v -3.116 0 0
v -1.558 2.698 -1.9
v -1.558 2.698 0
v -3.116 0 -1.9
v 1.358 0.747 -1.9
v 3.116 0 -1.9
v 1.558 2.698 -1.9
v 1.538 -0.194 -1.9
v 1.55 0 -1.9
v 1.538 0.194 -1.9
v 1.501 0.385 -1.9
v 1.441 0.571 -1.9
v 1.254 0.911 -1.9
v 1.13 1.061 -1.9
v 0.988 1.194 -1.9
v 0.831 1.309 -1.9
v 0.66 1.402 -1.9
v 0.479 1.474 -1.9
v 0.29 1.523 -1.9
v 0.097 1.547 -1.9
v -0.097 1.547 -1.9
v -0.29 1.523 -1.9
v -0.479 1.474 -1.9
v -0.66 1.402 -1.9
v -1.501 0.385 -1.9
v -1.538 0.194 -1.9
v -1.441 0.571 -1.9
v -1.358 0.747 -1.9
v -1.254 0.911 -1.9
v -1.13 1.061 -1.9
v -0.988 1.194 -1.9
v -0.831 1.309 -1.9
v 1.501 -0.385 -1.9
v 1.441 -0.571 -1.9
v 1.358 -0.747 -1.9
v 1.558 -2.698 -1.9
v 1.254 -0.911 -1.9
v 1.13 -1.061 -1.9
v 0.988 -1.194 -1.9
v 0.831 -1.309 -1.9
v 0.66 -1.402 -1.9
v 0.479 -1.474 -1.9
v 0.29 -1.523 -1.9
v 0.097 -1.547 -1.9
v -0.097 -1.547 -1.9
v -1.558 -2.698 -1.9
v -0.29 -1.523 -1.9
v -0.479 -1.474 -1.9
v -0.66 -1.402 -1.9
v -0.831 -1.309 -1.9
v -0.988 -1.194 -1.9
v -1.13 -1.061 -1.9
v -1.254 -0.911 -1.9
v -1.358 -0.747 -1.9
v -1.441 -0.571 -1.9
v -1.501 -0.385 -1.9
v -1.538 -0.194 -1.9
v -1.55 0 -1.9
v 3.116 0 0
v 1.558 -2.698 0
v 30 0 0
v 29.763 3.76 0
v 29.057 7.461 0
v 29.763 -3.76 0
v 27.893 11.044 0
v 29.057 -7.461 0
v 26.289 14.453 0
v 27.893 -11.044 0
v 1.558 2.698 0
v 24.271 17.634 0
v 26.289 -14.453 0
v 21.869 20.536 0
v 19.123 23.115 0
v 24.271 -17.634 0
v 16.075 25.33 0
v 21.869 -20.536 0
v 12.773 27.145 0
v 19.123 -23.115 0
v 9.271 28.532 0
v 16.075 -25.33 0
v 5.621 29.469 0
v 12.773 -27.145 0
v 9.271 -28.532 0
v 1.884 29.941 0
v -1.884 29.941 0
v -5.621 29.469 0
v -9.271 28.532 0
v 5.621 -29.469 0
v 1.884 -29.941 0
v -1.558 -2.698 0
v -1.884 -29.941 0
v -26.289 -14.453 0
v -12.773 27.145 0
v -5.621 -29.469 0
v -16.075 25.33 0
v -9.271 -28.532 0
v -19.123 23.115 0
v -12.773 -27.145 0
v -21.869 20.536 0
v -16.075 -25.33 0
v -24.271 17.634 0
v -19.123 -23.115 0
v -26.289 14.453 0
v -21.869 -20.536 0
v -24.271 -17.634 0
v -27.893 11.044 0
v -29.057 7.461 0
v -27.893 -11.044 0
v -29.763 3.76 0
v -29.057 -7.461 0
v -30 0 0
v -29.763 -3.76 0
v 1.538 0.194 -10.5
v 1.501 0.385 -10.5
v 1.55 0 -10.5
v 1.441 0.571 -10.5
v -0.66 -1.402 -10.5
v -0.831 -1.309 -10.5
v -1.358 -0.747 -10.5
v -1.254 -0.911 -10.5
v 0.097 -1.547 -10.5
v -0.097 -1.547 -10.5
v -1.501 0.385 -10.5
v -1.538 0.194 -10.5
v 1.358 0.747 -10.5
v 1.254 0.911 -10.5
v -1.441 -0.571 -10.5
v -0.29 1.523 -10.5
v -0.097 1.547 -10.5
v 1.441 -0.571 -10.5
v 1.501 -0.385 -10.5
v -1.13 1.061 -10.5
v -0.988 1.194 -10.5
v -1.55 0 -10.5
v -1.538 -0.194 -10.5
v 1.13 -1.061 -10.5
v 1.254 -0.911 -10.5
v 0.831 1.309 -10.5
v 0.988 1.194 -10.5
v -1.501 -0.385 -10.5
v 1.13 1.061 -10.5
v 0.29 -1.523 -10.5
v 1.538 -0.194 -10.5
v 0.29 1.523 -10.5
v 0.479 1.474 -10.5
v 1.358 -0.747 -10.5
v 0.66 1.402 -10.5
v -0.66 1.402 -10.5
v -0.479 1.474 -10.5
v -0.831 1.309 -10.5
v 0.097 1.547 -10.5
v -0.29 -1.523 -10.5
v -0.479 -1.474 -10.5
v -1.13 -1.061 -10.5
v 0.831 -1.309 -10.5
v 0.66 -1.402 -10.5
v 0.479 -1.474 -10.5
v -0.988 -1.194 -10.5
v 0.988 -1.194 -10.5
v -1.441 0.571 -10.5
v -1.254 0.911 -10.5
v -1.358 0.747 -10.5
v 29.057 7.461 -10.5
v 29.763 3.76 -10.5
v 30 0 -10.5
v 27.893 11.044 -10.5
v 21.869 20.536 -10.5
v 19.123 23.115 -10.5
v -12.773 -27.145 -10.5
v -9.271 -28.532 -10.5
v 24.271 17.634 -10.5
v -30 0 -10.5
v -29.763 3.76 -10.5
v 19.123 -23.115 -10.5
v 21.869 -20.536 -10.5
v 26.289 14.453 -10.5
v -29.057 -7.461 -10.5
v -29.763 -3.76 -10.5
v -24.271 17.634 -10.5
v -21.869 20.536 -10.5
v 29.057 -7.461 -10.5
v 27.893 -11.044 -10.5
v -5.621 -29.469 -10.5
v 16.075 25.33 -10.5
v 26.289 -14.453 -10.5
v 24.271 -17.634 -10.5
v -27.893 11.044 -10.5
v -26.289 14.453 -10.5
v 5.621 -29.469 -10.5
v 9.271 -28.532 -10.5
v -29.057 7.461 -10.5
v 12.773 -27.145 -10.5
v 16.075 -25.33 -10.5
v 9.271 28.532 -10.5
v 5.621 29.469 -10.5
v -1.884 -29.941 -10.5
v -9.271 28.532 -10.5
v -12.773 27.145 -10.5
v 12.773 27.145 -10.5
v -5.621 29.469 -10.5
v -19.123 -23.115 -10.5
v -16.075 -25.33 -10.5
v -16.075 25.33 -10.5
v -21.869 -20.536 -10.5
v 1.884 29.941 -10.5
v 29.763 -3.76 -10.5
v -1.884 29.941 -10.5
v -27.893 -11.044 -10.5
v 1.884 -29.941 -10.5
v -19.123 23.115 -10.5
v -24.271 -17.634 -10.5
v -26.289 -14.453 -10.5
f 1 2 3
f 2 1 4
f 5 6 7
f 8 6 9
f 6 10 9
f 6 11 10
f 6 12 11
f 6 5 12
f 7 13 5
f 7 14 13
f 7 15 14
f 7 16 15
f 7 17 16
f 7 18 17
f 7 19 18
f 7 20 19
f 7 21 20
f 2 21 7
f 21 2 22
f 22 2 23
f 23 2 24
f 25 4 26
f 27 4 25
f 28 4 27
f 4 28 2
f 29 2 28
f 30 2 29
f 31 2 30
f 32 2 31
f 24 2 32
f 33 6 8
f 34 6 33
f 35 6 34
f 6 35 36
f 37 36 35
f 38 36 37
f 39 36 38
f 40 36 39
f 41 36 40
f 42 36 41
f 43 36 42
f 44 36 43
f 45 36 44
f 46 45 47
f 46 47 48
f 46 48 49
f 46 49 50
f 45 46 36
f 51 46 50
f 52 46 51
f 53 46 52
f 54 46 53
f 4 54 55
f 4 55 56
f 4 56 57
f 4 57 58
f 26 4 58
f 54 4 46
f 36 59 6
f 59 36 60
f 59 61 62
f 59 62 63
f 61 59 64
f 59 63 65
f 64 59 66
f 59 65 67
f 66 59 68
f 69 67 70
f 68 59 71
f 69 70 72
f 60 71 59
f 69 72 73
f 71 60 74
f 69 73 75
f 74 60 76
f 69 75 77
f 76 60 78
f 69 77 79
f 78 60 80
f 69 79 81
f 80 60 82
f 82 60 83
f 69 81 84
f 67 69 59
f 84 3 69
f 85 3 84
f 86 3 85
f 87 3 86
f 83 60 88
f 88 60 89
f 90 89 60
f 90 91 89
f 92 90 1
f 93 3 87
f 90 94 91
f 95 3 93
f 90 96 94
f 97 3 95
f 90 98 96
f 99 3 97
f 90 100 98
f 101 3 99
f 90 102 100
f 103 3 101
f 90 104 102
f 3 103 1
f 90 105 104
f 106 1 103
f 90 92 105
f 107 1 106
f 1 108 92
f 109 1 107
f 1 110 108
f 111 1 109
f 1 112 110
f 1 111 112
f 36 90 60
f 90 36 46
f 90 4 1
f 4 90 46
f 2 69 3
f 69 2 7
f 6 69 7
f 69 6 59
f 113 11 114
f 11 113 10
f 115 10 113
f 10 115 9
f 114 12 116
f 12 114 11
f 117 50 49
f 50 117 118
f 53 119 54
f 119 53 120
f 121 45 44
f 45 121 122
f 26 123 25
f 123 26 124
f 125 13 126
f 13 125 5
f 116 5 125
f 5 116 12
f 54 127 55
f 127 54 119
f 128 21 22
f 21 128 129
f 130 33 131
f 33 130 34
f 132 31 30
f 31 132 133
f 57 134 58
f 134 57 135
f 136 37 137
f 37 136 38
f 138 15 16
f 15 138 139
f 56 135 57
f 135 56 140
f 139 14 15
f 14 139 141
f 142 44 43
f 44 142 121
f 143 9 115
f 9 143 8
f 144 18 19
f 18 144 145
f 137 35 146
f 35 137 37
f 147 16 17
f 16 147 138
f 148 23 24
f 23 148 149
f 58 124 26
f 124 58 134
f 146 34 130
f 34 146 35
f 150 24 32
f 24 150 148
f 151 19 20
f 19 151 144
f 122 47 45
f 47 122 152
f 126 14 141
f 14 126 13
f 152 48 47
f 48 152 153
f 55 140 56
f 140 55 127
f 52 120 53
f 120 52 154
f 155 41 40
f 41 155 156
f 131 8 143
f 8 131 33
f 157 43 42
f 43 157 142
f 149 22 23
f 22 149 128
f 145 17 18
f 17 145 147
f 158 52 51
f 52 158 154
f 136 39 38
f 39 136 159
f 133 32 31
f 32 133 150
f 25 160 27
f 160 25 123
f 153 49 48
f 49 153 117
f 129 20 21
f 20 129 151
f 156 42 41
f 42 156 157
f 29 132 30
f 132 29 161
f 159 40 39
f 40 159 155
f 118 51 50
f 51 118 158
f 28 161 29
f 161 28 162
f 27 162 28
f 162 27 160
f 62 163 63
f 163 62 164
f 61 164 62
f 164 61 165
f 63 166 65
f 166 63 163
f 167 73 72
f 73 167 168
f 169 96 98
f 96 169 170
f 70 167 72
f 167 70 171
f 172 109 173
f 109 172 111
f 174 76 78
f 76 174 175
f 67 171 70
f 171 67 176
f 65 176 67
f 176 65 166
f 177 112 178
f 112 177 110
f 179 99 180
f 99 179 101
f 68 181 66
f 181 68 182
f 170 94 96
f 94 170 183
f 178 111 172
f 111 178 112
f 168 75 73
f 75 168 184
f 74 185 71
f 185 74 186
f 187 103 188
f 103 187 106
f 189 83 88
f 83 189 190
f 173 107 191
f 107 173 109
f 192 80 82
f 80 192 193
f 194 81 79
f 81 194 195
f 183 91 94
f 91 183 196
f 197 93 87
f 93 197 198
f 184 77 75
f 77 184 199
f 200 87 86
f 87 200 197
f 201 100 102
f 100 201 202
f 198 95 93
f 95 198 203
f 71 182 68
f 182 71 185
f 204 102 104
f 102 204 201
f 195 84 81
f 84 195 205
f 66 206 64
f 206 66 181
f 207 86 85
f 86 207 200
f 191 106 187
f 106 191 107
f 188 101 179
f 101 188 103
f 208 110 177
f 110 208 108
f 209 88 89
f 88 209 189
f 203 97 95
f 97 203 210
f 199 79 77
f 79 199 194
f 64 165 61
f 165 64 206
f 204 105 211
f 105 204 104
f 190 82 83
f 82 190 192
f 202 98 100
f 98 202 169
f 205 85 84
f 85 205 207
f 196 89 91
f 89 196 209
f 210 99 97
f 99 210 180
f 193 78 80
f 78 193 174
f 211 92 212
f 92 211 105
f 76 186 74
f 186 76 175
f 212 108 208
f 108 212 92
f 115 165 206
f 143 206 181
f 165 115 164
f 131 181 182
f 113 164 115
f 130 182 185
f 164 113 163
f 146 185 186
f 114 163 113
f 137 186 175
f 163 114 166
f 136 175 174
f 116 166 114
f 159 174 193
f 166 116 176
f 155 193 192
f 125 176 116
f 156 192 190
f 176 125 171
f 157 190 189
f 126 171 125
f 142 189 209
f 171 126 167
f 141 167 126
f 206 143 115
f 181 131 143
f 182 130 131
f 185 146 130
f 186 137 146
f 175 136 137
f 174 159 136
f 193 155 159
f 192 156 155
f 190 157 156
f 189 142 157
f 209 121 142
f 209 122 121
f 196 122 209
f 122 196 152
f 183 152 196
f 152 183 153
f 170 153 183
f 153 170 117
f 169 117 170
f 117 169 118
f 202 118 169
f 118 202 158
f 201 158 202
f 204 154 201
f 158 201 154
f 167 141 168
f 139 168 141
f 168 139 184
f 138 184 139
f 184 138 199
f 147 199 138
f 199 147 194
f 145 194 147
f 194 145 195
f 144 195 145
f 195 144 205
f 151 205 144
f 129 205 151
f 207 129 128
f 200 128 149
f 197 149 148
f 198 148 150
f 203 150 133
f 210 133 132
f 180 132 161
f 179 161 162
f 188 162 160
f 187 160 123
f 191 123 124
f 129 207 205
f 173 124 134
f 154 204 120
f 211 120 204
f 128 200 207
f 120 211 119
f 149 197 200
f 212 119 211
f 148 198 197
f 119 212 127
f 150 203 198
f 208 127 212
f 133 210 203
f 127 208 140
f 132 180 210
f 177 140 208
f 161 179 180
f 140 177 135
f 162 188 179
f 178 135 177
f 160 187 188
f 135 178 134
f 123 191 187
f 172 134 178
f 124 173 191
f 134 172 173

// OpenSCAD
$fn = 50;

difference() {
	union() {
		translate(v = [0, 0, -10.5]) {
			cylinder(h = 10.5, r = 30.0);
		}
	}
	union() {
		translate(v = [0, 0, 0]) {
			rotate(a = [0, 0, 0]) {
				difference() {
					union() {
						translate(v = [0, 0, -1.9]) {
							linear_extrude(height = 1.9) {
								polygon(points = [[3.1158, 0.0], [1.5579000000000005, 2.698361953111554], [-1.5578999999999994, 2.6983619531115544], [-3.1158, 3.815754496783323e-16], [-1.5579000000000014, -2.6983619531115535], [1.557899999999998, -2.6983619531115552]]);
							}
						}
					}
					union();
				}
			}
		}
		#translate(v = [0, 0, -100.0]) {
			cylinder(h = 200, r = 1.55);
		}
	}
}
